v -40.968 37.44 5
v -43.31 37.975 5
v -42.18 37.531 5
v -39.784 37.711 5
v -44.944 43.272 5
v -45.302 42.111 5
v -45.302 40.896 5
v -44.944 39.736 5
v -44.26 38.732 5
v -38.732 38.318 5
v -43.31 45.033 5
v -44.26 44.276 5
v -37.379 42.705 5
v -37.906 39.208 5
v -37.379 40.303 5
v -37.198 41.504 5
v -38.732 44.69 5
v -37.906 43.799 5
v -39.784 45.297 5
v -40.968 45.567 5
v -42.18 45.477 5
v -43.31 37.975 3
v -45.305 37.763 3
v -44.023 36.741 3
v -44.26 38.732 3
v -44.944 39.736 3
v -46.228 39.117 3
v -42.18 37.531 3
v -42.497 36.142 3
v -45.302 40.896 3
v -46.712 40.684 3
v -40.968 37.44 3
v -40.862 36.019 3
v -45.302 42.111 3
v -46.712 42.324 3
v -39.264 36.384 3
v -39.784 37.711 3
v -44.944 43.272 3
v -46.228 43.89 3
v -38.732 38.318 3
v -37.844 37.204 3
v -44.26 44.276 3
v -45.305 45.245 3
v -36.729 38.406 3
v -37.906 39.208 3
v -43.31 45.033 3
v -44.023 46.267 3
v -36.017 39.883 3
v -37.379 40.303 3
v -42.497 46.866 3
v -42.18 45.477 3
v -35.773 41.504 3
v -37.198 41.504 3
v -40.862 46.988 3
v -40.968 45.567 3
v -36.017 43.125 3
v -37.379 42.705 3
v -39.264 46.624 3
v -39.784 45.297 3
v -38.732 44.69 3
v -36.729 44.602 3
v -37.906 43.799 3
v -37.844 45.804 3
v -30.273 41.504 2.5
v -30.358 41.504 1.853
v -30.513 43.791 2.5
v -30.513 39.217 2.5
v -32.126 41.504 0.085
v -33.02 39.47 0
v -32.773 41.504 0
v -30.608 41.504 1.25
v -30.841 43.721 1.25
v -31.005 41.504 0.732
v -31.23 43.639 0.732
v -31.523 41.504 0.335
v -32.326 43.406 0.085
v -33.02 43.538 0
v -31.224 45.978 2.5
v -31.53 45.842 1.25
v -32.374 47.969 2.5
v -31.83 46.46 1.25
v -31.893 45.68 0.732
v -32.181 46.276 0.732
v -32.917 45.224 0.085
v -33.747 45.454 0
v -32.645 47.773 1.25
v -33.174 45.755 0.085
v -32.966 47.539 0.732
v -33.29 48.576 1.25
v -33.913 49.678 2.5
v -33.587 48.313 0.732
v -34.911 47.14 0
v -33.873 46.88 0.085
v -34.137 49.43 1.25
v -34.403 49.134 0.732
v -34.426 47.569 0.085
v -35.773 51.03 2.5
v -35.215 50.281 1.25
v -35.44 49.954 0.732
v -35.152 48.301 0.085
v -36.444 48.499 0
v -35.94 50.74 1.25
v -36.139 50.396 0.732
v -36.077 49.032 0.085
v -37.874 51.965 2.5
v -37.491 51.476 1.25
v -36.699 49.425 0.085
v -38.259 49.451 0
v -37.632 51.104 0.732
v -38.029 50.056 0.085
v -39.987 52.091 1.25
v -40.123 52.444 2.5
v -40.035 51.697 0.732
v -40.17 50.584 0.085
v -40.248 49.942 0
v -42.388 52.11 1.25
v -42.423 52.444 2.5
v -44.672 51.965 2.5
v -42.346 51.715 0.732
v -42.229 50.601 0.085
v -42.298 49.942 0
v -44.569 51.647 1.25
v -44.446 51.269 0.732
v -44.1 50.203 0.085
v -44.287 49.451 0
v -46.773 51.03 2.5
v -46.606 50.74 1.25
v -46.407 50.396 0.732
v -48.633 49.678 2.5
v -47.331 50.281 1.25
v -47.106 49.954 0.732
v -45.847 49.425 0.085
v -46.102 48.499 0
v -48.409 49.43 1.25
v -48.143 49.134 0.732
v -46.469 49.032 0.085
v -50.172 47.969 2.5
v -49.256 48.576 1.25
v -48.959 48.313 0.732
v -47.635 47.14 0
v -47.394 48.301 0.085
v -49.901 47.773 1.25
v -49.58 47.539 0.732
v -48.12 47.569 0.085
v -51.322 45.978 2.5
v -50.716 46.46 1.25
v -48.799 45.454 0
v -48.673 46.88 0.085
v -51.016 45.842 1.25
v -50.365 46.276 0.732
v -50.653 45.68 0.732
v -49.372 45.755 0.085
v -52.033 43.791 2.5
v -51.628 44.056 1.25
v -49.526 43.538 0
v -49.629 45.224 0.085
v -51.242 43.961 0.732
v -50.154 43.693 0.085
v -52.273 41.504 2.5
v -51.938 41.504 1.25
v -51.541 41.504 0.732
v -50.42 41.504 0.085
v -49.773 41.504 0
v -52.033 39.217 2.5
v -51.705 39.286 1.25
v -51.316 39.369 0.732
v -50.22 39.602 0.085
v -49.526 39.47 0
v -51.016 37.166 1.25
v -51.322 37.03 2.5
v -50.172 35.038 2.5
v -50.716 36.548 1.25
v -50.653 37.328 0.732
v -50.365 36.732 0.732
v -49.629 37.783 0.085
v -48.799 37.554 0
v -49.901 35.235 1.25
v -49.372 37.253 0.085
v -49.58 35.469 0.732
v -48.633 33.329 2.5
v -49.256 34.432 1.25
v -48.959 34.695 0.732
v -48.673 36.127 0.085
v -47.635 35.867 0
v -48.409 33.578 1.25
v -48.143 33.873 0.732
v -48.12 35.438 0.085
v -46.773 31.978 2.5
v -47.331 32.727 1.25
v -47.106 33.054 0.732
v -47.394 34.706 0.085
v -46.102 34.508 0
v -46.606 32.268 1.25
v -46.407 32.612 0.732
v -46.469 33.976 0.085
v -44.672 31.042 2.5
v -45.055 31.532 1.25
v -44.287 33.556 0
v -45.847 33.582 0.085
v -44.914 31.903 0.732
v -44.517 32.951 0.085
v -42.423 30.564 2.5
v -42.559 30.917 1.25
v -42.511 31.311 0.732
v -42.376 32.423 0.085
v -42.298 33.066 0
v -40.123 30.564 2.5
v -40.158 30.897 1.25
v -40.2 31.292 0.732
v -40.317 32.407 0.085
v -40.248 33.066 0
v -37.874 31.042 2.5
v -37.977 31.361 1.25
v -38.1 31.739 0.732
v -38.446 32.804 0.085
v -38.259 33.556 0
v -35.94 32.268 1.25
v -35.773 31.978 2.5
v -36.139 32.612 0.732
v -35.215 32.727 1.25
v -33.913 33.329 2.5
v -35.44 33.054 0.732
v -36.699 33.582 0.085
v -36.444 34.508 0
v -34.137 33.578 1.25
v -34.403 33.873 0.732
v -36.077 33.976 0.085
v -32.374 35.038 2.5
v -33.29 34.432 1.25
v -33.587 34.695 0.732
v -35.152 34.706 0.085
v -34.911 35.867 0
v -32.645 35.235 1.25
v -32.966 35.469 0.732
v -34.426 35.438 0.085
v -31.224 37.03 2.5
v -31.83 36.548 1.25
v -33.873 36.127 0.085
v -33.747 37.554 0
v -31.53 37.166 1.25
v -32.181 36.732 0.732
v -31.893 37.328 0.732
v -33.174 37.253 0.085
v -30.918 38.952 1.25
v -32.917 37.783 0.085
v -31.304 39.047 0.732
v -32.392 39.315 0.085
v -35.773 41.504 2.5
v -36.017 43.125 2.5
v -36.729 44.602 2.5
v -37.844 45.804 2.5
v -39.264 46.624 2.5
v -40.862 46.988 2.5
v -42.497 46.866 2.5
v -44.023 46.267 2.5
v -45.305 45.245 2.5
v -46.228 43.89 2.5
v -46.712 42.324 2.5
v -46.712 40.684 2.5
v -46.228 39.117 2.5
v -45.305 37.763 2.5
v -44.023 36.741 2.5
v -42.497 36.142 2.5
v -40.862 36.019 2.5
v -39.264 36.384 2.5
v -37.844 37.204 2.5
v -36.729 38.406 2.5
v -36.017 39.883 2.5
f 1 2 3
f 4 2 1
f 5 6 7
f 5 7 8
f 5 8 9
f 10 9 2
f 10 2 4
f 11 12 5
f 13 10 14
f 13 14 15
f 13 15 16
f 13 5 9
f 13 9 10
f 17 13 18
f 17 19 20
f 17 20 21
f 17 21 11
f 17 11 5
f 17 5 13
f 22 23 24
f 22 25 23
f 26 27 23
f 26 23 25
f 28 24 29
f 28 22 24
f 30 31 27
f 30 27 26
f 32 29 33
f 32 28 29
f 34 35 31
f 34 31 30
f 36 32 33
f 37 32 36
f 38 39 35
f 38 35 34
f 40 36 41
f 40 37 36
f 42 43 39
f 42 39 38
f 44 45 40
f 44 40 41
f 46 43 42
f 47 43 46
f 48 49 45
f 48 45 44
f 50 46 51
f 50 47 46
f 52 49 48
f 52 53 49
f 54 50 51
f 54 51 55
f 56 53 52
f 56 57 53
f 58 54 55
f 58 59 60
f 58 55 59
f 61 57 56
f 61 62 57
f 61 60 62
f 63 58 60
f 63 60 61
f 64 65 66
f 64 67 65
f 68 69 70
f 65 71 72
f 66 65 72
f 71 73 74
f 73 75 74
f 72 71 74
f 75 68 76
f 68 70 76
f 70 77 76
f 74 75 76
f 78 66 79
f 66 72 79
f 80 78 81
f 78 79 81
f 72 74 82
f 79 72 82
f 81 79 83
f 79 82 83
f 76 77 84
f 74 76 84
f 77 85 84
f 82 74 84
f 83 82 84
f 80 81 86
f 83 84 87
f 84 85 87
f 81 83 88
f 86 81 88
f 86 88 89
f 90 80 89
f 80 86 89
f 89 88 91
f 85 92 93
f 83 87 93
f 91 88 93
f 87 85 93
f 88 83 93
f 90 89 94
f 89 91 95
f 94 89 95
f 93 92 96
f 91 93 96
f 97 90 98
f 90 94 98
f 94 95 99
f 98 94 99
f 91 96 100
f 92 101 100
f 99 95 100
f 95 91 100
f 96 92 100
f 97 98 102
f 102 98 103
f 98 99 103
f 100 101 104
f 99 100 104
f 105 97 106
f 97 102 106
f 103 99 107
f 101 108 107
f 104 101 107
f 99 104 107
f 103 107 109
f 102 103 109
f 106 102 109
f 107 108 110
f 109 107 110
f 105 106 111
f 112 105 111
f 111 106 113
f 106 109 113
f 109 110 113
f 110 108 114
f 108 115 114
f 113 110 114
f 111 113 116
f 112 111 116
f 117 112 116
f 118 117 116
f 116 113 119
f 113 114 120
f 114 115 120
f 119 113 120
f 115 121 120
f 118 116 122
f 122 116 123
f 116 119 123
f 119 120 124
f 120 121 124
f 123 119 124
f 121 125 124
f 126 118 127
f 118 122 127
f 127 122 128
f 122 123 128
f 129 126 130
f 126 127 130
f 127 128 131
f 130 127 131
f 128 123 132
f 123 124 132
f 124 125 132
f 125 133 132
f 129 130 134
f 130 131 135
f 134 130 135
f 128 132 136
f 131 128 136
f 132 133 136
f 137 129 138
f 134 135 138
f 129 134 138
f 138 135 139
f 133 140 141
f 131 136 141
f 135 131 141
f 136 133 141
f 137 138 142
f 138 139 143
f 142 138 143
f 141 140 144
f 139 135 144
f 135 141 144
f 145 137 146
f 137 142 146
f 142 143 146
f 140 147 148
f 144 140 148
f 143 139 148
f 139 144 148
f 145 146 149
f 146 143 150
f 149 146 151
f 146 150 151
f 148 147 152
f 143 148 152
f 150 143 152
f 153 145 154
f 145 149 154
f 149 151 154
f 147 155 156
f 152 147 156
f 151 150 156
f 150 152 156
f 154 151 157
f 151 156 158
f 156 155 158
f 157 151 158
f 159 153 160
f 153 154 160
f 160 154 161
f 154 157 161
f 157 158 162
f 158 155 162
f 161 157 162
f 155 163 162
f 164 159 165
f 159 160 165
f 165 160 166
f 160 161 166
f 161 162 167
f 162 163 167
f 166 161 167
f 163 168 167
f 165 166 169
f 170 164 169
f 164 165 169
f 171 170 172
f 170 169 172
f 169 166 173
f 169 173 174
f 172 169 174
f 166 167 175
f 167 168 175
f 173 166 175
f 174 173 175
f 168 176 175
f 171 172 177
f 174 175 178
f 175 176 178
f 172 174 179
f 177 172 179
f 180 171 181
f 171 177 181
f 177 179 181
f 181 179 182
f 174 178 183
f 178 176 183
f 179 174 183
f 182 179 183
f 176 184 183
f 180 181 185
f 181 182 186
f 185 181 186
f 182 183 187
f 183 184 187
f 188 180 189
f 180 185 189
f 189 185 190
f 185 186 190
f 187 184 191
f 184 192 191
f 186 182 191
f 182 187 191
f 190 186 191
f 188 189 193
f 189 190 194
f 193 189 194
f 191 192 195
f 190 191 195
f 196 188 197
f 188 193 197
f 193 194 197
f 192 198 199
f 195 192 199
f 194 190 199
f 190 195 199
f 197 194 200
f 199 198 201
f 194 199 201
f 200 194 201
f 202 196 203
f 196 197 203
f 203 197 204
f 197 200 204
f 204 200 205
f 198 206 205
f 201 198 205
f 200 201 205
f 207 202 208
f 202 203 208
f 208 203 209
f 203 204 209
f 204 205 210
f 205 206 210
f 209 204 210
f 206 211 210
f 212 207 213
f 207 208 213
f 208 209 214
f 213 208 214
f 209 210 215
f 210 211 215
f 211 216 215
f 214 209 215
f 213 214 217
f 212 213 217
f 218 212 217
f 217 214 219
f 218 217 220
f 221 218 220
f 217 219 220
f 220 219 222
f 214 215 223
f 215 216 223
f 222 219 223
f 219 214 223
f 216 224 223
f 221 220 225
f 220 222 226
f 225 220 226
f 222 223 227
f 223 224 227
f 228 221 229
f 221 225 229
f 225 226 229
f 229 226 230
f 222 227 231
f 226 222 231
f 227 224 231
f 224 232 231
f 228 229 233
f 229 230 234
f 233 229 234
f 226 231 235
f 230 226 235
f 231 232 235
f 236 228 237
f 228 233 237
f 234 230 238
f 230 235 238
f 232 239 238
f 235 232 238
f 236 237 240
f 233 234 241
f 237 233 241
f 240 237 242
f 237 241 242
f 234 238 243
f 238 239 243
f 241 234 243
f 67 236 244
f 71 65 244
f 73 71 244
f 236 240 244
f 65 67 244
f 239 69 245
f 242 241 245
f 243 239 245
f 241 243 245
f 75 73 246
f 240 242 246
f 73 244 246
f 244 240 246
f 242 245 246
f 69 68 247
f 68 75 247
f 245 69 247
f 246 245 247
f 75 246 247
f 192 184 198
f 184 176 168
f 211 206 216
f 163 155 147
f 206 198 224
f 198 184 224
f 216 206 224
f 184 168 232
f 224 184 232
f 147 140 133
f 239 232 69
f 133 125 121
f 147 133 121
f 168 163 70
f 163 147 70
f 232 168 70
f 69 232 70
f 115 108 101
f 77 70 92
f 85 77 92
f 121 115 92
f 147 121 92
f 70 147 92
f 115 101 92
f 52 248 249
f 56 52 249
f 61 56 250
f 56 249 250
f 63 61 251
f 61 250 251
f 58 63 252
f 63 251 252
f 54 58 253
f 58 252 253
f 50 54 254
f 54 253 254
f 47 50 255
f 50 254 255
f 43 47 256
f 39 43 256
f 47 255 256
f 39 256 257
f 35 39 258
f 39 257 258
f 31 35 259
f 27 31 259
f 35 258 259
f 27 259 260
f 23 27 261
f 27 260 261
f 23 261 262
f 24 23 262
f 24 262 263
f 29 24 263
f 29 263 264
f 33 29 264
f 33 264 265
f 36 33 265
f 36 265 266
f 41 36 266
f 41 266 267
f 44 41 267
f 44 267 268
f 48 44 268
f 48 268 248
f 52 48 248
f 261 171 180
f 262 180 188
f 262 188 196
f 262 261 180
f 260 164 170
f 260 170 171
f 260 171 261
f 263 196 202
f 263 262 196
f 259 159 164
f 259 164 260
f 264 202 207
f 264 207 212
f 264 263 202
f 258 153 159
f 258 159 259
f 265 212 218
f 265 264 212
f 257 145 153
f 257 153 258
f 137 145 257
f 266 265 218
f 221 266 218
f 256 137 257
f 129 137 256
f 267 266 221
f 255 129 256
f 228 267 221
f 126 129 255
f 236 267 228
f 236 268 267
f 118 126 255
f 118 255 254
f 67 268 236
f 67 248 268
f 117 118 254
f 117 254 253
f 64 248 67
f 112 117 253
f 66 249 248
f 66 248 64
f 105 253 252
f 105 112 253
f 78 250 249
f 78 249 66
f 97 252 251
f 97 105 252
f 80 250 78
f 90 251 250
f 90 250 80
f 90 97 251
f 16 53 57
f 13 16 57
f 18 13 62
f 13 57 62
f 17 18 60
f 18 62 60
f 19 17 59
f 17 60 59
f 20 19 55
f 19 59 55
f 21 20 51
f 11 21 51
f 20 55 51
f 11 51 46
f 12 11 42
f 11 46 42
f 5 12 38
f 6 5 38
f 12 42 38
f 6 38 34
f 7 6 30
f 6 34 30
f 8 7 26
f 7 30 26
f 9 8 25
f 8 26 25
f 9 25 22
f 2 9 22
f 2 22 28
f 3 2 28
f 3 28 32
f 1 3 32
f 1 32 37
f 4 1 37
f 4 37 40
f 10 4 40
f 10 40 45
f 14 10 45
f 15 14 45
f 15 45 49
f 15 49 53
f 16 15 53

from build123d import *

# Parameters (mm, degrees)
F0_R     = 11
F0_R_2   = 5.5
F1_DEPTH = 2.5
F0_R_3   = 4.075
F2_DEPTH = 3
F3_DEPTH = 5
F4_R     = 2.49999


# Not quite as in the source:
# - a fillet or chamfer is up to 0.001 mm smaller than in the source, because OpenCascade refuses the exact size


with BuildPart() as f1:
    # F0 (on Top) → F1 (new body)
    with BuildSketch(Plane.XY):
        with Locations((-41.2729866803, 41.5038391948)):
            Circle(F0_R)
        with Locations((-41.2729866803, 41.5038391948)):
            Circle(F0_R_2, mode=Mode.SUBTRACT)
    extrude(amount=F1_DEPTH)

    # F0 (on Top) → F2 (join)
    with BuildSketch(Plane.XY):
        with Locations((-41.2729866803, 41.5038391948)):
            Circle(F0_R_2)
        with Locations((-41.2729866803, 41.5038391948)):
            Circle(F0_R_3, mode=Mode.SUBTRACT)
    extrude(amount=F2_DEPTH)

    # F0 (on Top) → F3 (join)
    with BuildSketch(Plane.XY):
        with Locations((-41.2729866803, 41.5038391948)):
            Circle(F0_R_3)
    extrude(amount=F3_DEPTH)

    # F4 (radius 2.5 in the source; OpenCascade refuses exactly that, so slightly less here)
    f4_edges = [f1.edges().sort_by_distance(p)[0] for p in [
        (-52.272987, 41.503839, 0),
    ]]
    fillet(f4_edges, radius=F4_R)


solid = f1.part
